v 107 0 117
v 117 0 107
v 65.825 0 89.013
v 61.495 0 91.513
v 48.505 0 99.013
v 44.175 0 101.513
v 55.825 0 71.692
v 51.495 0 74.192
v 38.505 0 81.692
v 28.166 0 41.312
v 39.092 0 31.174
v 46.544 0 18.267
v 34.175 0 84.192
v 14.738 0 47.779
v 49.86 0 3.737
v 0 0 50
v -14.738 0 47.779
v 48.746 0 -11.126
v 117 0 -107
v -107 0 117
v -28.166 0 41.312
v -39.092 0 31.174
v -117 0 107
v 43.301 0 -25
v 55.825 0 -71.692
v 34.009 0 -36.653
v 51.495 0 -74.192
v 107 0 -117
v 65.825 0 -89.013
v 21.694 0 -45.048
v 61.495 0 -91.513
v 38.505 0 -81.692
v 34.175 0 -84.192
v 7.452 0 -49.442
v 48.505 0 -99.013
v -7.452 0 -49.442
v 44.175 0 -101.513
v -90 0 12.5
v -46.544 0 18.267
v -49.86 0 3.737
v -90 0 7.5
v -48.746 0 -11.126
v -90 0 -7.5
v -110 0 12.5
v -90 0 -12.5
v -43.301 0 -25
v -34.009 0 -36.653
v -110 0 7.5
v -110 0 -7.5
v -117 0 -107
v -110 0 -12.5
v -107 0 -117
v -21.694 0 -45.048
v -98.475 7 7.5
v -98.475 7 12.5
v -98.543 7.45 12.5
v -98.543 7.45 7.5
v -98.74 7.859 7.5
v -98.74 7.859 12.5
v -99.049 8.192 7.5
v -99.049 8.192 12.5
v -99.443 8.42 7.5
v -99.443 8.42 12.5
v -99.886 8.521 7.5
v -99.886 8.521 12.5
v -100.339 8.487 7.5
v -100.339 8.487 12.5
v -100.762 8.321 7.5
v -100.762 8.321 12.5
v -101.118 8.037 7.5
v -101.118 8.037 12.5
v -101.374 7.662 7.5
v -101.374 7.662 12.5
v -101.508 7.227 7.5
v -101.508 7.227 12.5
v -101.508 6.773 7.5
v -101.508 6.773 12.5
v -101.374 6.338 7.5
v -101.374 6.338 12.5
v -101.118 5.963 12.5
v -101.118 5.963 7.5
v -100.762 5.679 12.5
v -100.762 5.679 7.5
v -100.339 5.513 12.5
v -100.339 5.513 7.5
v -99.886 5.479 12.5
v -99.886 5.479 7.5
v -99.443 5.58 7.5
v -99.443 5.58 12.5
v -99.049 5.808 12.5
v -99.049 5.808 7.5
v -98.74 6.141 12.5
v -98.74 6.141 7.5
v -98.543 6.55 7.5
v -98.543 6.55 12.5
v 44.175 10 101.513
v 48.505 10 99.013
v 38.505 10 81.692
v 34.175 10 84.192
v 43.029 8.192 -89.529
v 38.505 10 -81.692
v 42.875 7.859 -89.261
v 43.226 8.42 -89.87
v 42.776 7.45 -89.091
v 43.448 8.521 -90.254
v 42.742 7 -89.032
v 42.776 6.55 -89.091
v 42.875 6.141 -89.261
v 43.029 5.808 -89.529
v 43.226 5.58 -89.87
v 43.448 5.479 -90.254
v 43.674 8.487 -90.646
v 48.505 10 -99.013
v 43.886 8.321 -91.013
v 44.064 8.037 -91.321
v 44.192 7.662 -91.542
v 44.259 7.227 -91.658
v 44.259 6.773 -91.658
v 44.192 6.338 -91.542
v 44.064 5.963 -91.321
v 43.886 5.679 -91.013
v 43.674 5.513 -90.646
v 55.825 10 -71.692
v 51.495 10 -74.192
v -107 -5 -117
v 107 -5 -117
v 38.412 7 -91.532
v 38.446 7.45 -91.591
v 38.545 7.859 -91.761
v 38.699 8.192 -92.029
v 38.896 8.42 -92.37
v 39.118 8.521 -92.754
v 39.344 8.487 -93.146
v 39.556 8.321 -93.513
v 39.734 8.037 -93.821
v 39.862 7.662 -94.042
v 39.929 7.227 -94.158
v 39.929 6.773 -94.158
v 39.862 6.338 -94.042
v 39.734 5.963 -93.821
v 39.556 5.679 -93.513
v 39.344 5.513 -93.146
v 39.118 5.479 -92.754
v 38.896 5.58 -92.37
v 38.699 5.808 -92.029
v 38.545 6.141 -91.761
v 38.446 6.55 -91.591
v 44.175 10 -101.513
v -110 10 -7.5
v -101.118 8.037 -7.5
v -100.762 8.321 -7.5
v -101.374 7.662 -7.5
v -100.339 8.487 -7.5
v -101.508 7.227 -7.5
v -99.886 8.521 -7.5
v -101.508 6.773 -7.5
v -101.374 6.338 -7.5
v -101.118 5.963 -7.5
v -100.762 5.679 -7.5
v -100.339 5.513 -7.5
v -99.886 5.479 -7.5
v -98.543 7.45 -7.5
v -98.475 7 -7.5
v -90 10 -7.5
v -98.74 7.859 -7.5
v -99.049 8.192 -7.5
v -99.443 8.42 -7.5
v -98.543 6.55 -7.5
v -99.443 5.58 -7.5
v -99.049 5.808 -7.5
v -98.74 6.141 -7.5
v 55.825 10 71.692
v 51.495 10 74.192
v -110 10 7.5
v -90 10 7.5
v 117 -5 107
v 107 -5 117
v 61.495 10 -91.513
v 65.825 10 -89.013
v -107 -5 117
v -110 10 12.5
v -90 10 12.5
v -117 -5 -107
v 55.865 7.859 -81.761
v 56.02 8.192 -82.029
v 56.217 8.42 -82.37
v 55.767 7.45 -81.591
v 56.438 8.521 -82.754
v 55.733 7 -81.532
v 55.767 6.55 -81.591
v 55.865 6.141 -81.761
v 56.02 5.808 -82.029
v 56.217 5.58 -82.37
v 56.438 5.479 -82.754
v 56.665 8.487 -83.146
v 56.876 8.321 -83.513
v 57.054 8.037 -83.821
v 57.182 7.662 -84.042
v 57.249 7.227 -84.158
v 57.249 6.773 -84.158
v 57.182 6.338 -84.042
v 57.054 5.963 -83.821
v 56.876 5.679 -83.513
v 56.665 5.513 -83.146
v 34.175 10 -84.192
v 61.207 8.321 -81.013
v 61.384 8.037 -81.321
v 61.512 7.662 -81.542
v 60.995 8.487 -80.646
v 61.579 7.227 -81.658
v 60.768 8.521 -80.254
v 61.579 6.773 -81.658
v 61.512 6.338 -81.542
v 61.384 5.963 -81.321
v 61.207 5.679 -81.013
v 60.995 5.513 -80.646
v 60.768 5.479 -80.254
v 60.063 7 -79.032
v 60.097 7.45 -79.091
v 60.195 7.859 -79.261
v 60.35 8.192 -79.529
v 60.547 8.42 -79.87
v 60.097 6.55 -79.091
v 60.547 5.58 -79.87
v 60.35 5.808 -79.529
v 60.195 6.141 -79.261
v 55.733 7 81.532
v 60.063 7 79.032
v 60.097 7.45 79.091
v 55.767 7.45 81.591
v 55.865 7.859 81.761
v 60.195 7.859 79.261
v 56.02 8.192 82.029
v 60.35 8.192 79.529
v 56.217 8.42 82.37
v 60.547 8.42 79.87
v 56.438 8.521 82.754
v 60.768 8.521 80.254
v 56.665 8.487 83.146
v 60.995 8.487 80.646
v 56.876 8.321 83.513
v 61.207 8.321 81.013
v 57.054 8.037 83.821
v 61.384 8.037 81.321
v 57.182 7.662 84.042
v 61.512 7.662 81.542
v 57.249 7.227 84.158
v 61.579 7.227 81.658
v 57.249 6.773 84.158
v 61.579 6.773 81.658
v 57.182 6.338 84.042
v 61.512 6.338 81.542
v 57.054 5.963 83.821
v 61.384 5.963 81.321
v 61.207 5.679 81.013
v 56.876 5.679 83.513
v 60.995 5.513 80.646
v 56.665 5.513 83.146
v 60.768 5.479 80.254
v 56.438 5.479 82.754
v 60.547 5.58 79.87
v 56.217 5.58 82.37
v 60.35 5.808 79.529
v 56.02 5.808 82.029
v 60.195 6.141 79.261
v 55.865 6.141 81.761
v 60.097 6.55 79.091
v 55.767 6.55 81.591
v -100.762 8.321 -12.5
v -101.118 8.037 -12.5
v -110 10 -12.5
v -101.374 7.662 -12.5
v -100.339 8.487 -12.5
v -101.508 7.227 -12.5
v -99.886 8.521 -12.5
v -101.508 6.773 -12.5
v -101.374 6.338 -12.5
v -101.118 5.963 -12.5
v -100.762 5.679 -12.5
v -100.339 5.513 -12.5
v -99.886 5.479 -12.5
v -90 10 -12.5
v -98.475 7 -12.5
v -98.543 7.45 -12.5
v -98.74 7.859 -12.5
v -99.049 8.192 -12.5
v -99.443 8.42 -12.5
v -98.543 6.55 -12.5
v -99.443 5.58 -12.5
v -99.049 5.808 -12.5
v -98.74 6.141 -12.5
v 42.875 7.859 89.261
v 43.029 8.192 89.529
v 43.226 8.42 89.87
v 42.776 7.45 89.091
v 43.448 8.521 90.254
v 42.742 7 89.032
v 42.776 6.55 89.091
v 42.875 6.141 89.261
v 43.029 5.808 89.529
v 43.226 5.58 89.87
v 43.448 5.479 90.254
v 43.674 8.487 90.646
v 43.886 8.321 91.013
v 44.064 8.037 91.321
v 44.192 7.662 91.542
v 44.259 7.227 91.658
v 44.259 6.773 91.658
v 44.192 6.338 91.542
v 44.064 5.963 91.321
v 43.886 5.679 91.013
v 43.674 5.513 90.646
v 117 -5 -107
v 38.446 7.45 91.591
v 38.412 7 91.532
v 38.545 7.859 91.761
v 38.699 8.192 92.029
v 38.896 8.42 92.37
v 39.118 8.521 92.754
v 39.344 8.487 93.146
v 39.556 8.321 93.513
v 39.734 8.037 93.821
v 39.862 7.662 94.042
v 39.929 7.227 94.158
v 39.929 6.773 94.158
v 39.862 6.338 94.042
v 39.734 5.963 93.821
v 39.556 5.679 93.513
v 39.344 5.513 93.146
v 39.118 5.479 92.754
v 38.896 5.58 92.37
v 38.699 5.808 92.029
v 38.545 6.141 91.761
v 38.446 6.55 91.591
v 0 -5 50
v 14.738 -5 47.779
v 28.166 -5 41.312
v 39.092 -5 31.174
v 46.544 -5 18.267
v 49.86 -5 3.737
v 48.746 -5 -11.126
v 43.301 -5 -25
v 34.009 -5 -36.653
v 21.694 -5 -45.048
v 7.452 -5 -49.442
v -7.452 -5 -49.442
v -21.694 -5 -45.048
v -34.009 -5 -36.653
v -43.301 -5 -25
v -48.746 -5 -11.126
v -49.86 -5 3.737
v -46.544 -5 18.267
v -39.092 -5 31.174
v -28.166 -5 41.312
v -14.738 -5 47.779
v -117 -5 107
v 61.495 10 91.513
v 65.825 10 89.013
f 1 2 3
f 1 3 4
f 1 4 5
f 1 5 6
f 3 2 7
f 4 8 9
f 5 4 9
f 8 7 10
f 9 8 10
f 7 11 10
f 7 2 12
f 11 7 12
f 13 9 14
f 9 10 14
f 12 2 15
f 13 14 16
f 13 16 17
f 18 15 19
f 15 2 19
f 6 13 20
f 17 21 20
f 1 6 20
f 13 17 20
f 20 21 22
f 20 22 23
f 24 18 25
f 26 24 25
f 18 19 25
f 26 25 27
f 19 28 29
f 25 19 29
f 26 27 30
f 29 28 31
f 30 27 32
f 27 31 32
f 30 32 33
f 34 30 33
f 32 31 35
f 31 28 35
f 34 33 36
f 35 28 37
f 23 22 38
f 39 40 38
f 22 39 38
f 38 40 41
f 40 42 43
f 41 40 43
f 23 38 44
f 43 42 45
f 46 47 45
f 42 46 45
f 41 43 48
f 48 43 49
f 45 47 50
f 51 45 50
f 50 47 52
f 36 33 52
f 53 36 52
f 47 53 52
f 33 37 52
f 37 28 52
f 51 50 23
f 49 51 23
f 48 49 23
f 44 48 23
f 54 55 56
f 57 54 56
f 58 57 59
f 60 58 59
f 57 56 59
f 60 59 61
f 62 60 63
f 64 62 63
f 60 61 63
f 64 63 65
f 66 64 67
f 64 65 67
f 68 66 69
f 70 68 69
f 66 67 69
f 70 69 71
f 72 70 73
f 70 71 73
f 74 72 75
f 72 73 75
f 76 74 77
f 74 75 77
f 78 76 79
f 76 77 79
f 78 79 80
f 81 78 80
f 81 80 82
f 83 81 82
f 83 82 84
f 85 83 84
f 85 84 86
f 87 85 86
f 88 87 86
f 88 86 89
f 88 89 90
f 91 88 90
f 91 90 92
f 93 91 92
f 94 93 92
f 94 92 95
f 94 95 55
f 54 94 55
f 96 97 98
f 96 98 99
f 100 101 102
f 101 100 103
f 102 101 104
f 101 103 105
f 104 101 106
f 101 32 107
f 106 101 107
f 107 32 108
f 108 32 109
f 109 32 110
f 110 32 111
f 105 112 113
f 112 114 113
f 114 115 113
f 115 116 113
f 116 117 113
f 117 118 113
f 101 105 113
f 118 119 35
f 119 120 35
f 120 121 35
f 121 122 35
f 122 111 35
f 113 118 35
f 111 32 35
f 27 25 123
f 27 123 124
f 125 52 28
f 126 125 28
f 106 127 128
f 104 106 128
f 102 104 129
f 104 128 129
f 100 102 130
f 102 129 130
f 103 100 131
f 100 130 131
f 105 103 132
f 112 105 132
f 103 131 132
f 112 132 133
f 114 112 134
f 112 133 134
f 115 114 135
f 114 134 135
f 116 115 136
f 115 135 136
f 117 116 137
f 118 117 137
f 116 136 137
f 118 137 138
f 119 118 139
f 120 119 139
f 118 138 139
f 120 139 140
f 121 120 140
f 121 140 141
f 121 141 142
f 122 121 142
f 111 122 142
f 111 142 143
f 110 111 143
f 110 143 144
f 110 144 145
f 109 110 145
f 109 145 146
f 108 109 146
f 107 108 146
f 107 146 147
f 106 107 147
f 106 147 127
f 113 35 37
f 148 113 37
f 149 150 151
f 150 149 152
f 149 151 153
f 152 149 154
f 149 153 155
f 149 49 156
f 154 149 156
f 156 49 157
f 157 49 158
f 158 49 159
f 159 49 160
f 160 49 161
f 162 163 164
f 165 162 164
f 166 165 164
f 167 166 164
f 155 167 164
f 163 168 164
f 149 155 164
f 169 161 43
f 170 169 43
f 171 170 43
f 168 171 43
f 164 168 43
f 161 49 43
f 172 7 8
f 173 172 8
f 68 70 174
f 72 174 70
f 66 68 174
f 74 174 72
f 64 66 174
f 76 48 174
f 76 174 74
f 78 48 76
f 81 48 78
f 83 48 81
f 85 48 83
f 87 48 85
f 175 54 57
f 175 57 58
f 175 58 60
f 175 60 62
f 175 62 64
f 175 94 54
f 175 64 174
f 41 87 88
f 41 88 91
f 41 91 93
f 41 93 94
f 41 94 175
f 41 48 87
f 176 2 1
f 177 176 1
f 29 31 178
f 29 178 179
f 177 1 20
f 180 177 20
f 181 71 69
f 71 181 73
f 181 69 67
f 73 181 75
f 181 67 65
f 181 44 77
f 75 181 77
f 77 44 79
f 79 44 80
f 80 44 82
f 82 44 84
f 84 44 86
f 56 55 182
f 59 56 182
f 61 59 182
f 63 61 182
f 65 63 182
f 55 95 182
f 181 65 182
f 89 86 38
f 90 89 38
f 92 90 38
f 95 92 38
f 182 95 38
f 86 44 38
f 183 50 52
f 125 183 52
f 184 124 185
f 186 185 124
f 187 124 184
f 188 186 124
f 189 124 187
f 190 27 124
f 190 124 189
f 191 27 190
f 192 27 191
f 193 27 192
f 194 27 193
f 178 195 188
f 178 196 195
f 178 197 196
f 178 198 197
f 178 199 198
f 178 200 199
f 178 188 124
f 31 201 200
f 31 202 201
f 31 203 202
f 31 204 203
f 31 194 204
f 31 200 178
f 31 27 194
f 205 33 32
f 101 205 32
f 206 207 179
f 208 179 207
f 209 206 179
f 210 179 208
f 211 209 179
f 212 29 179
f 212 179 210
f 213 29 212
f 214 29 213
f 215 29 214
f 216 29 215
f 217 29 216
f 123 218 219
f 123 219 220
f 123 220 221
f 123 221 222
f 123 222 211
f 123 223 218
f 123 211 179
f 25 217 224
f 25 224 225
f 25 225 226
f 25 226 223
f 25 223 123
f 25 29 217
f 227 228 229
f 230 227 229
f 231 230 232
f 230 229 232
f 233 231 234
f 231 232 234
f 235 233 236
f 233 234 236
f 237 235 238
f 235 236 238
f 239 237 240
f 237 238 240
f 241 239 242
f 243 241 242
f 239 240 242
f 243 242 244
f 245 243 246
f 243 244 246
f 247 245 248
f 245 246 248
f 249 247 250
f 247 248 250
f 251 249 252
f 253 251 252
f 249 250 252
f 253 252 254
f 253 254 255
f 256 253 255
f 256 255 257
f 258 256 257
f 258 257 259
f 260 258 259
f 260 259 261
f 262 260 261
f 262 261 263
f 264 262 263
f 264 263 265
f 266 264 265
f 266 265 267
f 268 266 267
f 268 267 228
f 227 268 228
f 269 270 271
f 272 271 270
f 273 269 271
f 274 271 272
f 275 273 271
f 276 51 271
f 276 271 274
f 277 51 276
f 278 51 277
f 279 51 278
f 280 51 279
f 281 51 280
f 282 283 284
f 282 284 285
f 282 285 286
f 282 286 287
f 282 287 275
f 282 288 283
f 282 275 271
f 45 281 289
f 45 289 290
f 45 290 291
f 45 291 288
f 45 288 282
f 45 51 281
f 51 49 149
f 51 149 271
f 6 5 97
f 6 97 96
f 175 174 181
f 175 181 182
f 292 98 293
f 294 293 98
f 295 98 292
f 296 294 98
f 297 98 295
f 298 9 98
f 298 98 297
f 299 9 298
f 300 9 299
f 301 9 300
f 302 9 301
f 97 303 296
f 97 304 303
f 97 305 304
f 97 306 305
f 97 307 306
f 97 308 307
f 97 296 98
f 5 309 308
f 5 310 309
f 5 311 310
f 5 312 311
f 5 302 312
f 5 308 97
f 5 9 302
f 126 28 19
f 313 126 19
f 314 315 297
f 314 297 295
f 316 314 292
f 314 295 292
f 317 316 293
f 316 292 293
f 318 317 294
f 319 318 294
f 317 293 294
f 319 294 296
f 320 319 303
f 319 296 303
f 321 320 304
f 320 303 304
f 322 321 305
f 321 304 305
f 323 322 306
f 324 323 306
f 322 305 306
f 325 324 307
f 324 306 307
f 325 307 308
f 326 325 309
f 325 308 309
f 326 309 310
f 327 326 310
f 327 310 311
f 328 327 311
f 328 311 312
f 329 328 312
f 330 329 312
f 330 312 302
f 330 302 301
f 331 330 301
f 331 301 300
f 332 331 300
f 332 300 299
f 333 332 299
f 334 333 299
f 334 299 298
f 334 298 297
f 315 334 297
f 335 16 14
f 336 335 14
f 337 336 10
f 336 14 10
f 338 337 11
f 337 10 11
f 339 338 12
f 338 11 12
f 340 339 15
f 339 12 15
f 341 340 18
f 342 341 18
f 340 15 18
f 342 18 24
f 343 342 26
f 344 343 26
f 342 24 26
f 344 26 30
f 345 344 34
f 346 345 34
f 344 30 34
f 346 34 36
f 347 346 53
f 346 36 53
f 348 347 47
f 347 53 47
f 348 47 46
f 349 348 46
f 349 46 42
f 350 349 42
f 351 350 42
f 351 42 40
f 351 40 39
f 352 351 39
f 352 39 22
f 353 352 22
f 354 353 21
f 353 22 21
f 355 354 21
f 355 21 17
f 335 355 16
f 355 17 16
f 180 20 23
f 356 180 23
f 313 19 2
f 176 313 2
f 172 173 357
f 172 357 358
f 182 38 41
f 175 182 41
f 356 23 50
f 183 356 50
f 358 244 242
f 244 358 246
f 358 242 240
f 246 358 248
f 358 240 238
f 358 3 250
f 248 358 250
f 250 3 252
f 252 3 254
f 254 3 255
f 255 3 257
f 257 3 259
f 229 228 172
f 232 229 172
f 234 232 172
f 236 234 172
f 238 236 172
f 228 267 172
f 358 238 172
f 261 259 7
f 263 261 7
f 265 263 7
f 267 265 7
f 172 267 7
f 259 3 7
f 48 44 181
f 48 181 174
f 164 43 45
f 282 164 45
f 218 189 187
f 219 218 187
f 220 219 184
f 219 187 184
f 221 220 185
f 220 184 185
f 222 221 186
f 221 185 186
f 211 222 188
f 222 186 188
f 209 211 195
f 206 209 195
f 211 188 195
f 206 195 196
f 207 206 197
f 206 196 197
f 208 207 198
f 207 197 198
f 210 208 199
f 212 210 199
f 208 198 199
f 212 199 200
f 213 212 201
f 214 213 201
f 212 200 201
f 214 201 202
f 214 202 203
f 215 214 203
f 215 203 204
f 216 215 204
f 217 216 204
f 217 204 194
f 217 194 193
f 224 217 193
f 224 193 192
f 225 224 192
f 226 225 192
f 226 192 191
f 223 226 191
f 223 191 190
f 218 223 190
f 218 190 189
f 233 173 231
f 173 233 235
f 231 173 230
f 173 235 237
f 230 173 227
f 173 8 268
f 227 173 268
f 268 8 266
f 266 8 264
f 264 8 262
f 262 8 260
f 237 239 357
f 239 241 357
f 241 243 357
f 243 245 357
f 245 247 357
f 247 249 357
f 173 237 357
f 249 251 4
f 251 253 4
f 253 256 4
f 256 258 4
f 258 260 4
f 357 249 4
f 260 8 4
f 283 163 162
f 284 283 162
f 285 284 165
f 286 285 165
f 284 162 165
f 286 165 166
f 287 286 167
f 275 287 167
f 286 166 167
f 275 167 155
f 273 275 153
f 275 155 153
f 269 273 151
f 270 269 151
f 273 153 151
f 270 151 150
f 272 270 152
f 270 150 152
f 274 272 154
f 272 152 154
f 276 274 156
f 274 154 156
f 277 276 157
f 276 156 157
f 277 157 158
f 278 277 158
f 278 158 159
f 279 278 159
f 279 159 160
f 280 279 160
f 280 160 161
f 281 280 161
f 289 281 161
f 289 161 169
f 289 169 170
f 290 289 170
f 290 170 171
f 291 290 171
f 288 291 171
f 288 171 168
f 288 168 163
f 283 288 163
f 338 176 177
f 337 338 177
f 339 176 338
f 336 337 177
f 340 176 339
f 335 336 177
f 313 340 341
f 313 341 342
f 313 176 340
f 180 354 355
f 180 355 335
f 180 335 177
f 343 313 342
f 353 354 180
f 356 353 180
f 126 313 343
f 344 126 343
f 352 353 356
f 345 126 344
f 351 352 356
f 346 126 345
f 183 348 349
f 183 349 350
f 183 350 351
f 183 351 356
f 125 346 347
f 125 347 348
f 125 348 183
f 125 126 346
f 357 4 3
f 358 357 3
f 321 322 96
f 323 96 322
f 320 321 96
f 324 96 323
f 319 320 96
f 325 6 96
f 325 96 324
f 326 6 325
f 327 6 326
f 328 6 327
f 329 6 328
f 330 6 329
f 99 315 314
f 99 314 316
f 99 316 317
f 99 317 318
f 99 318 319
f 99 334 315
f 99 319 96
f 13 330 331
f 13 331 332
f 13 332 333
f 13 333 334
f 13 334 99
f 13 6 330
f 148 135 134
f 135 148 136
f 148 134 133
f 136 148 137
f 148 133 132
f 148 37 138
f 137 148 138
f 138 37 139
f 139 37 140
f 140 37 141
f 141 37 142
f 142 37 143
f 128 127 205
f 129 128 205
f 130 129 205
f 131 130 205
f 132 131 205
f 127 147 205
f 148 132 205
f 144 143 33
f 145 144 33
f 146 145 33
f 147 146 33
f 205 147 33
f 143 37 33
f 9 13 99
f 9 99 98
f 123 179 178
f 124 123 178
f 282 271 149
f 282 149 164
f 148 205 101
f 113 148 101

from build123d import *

# Parameters (mm, degrees)
BOSS_EXTRUDE1_DEPTH   = 10
BOSS_EXTRUDE1_2_DEPTH = 10
BOSS_EXTRUDE1_3_DEPTH = 10
BOSS_EXTRUDE1_4_DEPTH = 10
SKETCH1_W             = 20
SKETCH1_H             = 5
BOSS_EXTRUDE1_5_DEPTH = 10
BOSS_EXTRUDE1_6_DEPTH = 10
SKETCH2_R             = 50
BOSS_EXTRUDE2_DEPTH   = 5
SKETCH3_R             = 1.525
CUT_EXTRUDE1_DEPTH    = 30
SKETCH4_R             = 1.525
CUT_EXTRUDE2_DEPTH    = 30
SKETCH5_R             = 1.525
CUT_EXTRUDE3_DEPTH    = 30


with BuildPart() as part:
    # Sketch1 → Boss-Extrude1 (new body)
    with BuildSketch(Plane(origin=(0, 0, 0), x_dir=(1, 0, 0), z_dir=(0, 1, 0))):
        Polygon((44.174682453, 101.512794416), (34.174682453, 84.192286341), (38.504809472, 81.692286341), (48.504809472, 99.012794416), align=None)
    extrude(amount=BOSS_EXTRUDE1_DEPTH)



with BuildPart() as body_2:
    # Sketch1 → Boss-Extrude1 2 (new body)
    with BuildSketch(Plane(origin=(0, 0, 0), x_dir=(1, 0, 0), z_dir=(0, 1, 0))):
        Polygon((61.495190528, 91.512794416), (65.825317547, 89.012794416), (55.825317547, 71.692286341), (51.495190528, 74.192286341), align=None)
    extrude(amount=BOSS_EXTRUDE1_2_DEPTH)


with BuildPart() as body_3:
    # Sketch1 → Boss-Extrude1 3 (new body)
    with BuildSketch(Plane(origin=(0, 0, 0), x_dir=(1, 0, 0), z_dir=(0, 1, 0))):
        Polygon((65.825317547, -89.012794416), (55.825317547, -71.692286341), (51.495190528, -74.192286341), (61.495190528, -91.512794416), align=None)
    extrude(amount=BOSS_EXTRUDE1_3_DEPTH)


with BuildPart() as body_4:
    # Sketch1 → Boss-Extrude1 4 (new body)
    with BuildSketch(Plane(origin=(0, 0, 0), x_dir=(1, 0, 0), z_dir=(0, 1, 0))):
        Polygon((48.504809472, -99.012794416), (44.174682453, -101.512794416), (34.174682453, -84.192286341), (38.504809472, -81.692286341), align=None)
    extrude(amount=BOSS_EXTRUDE1_4_DEPTH)


with BuildPart() as body_5:
    # Sketch1 → Boss-Extrude1 5 (new body)
    with BuildSketch(Plane(origin=(0, 0, 0), x_dir=(1, 0, 0), z_dir=(0, 1, 0))):
        with Locations((-100, -10)):
            Rectangle(SKETCH1_W, SKETCH1_H)
    extrude(amount=BOSS_EXTRUDE1_5_DEPTH)


with BuildPart() as body_6:
    # Sketch1 → Boss-Extrude1 6 (new body)
    with BuildSketch(Plane(origin=(0, 0, 0), x_dir=(1, 0, 0), z_dir=(0, 1, 0))):
        with Locations((-100, 10)):
            Rectangle(SKETCH1_W, SKETCH1_H)
    extrude(amount=BOSS_EXTRUDE1_6_DEPTH)


with BuildPart() as part_1:
    add(part.part)

    add(body_2.part)  # Boss-Extrude2 merges body 2

    add(body_3.part)  # Boss-Extrude2 merges body 3

    add(body_4.part)  # Boss-Extrude2 merges body 4

    add(body_5.part)  # Boss-Extrude2 merges body 5

    add(body_6.part)  # Boss-Extrude2 merges body 6
    # Sketch2 → Boss-Extrude2 (add)
    with BuildSketch(Plane(origin=(0, 0, 0), x_dir=(1, 0, 0), z_dir=(0, 1, 0))):
        Polygon((-117, 107), (-107, 117), (107, 117), (117, 107), (117, -107), (107, -117), (-107, -117), (-117, -107), align=None)
        with Locations(Location((0, 0, 0), (0, 0, 270))):
            Circle(SKETCH2_R, mode=Mode.SUBTRACT)
    extrude(amount=-BOSS_EXTRUDE2_DEPTH)

    # Sketch3 → Cut-Extrude1 (cut)
    with BuildSketch(Plane.XY.offset(12.5)):
        with Locations((-100, 7)):
            Circle(SKETCH3_R)
    extrude(amount=-CUT_EXTRUDE1_DEPTH, mode=Mode.SUBTRACT)

    # Sketch4 → Cut-Extrude2 (cut)
    with BuildSketch(Plane(origin=(10.825317547, 0, -6.25), x_dir=(-0.5000000000000004, 0, -0.8660254037844385), z_dir=(0.8660254037844384, 0, -0.5000000000000003))):
        with Locations((-100, 7)):
            Circle(SKETCH4_R)
    extrude(amount=-CUT_EXTRUDE2_DEPTH, mode=Mode.SUBTRACT)

    # Sketch5 → Cut-Extrude3 (cut)
    with BuildSketch(Plane(origin=(-10.825317547, 0, -6.25), x_dir=(-0.5000000000000001, 0, 0.8660254037844386), z_dir=(-0.8660254037844386, 0, -0.5000000000000001))):
        with Locations((-100, 7)):
            Circle(SKETCH5_R)
    extrude(amount=-CUT_EXTRUDE3_DEPTH, mode=Mode.SUBTRACT)


solid = part_1.part
